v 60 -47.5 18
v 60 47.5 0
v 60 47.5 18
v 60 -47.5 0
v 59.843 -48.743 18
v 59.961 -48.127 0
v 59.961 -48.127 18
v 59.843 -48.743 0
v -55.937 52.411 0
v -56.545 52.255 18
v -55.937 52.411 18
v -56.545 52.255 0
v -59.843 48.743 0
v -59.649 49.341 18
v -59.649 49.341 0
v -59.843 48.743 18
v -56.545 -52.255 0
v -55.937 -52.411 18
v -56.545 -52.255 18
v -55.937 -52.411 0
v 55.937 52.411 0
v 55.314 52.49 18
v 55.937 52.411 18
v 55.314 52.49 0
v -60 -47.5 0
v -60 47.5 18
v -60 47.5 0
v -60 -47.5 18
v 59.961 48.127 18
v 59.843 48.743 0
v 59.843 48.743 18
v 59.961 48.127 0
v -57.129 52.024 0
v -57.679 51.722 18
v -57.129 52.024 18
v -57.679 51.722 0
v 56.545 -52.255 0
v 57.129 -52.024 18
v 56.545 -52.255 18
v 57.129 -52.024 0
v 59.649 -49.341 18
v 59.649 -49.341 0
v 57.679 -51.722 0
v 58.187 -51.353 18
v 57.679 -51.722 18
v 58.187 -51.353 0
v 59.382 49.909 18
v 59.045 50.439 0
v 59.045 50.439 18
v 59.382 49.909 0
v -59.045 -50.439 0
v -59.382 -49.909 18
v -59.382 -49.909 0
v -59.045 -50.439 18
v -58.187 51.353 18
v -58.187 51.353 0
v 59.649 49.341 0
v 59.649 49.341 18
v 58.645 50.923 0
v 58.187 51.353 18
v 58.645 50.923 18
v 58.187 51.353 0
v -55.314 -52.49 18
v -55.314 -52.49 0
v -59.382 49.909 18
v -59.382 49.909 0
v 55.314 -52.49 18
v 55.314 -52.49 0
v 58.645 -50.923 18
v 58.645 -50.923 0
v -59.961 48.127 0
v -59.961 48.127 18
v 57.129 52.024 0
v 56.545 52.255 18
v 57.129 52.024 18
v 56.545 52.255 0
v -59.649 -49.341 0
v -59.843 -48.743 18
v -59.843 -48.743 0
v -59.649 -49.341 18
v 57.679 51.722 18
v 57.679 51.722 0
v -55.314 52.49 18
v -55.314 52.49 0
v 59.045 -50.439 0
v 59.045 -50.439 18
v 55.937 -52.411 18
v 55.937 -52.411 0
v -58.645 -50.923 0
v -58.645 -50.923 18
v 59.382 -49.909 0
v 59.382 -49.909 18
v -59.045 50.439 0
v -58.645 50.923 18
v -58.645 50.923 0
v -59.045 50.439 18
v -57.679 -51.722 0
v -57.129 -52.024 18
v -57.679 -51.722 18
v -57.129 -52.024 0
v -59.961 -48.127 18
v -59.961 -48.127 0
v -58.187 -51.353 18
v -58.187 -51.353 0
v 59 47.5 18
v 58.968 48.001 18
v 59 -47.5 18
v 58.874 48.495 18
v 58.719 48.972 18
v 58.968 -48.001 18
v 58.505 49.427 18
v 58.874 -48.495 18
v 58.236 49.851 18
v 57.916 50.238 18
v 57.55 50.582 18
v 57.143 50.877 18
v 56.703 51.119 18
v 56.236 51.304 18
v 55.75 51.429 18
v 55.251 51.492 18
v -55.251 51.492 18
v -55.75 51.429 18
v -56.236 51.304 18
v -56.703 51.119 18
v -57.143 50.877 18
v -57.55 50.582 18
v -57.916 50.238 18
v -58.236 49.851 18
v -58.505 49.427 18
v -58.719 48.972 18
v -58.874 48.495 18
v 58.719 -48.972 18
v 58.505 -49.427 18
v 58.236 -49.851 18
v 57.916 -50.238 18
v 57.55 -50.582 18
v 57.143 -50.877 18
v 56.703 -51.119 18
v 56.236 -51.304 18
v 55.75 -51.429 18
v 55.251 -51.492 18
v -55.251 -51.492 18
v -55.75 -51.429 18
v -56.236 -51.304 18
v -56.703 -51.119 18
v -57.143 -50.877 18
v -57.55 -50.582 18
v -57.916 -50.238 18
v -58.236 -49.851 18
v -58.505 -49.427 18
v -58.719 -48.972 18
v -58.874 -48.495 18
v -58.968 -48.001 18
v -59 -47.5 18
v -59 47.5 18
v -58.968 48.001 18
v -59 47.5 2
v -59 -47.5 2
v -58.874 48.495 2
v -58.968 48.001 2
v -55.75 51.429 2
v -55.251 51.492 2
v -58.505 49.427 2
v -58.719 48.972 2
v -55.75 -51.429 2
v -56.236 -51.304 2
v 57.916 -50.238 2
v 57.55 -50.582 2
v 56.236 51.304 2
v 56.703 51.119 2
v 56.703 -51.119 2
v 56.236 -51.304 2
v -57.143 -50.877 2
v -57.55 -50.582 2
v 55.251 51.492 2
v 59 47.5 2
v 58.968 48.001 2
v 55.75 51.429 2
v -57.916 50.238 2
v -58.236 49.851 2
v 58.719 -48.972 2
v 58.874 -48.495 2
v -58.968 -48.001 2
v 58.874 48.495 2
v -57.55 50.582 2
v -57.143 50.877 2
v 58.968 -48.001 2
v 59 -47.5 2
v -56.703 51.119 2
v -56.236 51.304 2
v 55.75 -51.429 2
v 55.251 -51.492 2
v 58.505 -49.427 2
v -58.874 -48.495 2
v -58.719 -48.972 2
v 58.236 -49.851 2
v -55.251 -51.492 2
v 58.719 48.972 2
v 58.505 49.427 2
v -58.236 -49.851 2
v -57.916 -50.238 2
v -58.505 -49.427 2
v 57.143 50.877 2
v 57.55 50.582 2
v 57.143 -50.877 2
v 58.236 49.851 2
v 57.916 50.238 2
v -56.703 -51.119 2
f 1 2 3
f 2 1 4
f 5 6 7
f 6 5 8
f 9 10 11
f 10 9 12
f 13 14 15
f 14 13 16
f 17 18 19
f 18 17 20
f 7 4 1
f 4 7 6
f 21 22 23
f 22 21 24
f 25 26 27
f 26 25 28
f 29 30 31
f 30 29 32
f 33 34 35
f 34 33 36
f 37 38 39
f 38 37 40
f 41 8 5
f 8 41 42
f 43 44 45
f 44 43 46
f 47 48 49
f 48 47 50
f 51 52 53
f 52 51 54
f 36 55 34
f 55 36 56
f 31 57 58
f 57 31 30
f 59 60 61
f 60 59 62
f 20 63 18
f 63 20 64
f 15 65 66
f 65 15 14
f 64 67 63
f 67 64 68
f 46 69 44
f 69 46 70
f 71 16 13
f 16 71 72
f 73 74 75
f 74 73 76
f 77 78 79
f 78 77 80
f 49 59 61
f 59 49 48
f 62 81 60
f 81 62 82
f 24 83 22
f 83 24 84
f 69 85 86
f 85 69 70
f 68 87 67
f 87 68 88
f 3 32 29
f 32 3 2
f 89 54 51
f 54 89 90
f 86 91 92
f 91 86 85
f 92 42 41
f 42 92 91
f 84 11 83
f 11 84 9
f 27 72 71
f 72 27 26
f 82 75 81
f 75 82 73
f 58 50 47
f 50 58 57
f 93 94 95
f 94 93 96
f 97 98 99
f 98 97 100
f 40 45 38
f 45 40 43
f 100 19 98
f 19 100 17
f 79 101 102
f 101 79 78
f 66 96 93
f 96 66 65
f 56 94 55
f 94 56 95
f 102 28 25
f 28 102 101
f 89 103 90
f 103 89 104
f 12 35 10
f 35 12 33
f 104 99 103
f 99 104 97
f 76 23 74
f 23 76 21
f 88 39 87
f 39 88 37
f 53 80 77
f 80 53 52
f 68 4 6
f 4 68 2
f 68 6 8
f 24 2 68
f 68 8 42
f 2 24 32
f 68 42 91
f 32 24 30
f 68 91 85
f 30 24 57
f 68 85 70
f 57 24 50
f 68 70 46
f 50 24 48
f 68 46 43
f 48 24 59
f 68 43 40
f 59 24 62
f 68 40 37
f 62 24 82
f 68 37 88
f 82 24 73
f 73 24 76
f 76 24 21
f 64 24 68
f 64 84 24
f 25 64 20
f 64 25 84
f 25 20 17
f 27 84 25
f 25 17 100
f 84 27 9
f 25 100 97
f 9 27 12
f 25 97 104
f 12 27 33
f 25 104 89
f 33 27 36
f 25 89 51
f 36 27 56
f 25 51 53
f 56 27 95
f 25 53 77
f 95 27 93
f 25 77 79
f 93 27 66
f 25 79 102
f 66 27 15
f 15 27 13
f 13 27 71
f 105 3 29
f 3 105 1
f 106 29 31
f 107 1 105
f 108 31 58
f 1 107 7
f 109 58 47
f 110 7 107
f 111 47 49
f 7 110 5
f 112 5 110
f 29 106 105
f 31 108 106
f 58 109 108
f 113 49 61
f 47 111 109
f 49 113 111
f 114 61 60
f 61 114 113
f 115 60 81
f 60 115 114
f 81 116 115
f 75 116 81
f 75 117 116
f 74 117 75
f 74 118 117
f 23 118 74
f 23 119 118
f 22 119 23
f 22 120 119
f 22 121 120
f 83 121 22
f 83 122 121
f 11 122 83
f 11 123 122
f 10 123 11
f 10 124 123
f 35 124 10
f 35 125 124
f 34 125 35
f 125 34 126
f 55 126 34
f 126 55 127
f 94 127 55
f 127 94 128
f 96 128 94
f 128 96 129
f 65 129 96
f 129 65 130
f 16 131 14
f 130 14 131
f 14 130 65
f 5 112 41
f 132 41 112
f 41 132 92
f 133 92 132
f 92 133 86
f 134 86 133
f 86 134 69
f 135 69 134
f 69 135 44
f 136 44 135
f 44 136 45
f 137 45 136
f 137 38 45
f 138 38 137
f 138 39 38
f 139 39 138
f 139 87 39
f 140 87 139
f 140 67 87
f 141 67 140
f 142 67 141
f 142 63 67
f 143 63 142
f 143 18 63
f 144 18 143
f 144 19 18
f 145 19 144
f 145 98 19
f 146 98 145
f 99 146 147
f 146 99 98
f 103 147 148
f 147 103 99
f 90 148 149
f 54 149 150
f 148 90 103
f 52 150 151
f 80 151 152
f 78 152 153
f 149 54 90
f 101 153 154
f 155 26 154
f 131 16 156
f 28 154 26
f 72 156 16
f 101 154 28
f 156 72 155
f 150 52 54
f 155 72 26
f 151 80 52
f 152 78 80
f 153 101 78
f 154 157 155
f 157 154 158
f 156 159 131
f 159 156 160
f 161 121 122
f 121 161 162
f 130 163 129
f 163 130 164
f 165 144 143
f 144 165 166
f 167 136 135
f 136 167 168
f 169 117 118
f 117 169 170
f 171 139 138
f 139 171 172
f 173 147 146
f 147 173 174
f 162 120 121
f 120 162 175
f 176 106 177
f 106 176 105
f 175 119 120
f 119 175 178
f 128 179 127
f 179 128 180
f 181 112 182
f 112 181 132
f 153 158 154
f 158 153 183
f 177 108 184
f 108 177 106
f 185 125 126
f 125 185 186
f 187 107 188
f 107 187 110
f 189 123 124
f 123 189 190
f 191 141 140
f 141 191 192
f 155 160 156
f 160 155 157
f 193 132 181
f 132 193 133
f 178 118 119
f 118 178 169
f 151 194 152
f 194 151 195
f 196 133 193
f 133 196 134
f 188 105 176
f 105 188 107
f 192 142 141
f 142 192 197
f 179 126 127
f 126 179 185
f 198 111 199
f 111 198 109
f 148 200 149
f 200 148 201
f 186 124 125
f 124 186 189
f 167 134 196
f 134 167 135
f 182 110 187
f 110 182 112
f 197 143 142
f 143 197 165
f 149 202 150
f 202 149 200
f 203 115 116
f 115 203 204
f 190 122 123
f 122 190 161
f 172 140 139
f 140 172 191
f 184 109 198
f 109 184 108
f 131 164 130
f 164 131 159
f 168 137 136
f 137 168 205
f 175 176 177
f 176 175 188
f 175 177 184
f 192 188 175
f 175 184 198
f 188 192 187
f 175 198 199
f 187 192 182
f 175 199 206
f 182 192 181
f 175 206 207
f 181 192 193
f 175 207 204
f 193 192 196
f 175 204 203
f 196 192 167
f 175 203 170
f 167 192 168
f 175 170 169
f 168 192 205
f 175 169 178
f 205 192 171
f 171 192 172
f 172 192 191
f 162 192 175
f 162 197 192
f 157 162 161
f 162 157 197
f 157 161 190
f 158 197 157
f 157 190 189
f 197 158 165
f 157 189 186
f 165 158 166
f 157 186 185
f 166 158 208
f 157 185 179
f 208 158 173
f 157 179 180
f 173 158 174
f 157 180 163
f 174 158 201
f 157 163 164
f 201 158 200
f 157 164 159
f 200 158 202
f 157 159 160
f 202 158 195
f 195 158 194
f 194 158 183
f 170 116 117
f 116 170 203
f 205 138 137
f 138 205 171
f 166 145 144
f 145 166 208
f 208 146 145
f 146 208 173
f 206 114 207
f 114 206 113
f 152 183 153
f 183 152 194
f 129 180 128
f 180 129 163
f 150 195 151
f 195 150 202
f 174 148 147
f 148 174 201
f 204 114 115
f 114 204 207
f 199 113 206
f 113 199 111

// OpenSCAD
$fn = 50;


difference() {
	union() {
		hull() {
			translate(v = [-55.0000000000, 47.5000000000, 0]) {
				cylinder(h = 18, r = 5);
			}
			translate(v = [55.0000000000, 47.5000000000, 0]) {
				cylinder(h = 18, r = 5);
			}
			translate(v = [-55.0000000000, -47.5000000000, 0]) {
				cylinder(h = 18, r = 5);
			}
			translate(v = [55.0000000000, -47.5000000000, 0]) {
				cylinder(h = 18, r = 5);
			}
		}
	}
	union() {
		translate(v = [0, 0, 2]) {
			hull() {
				translate(v = [-55.0000000000, 47.5000000000, 0]) {
					cylinder(h = 16, r = 4);
				}
				translate(v = [55.0000000000, 47.5000000000, 0]) {
					cylinder(h = 16, r = 4);
				}
				translate(v = [-55.0000000000, -47.5000000000, 0]) {
					cylinder(h = 16, r = 4);
				}
				translate(v = [55.0000000000, -47.5000000000, 0]) {
					cylinder(h = 16, r = 4);
				}
			}
		}
	}
}
